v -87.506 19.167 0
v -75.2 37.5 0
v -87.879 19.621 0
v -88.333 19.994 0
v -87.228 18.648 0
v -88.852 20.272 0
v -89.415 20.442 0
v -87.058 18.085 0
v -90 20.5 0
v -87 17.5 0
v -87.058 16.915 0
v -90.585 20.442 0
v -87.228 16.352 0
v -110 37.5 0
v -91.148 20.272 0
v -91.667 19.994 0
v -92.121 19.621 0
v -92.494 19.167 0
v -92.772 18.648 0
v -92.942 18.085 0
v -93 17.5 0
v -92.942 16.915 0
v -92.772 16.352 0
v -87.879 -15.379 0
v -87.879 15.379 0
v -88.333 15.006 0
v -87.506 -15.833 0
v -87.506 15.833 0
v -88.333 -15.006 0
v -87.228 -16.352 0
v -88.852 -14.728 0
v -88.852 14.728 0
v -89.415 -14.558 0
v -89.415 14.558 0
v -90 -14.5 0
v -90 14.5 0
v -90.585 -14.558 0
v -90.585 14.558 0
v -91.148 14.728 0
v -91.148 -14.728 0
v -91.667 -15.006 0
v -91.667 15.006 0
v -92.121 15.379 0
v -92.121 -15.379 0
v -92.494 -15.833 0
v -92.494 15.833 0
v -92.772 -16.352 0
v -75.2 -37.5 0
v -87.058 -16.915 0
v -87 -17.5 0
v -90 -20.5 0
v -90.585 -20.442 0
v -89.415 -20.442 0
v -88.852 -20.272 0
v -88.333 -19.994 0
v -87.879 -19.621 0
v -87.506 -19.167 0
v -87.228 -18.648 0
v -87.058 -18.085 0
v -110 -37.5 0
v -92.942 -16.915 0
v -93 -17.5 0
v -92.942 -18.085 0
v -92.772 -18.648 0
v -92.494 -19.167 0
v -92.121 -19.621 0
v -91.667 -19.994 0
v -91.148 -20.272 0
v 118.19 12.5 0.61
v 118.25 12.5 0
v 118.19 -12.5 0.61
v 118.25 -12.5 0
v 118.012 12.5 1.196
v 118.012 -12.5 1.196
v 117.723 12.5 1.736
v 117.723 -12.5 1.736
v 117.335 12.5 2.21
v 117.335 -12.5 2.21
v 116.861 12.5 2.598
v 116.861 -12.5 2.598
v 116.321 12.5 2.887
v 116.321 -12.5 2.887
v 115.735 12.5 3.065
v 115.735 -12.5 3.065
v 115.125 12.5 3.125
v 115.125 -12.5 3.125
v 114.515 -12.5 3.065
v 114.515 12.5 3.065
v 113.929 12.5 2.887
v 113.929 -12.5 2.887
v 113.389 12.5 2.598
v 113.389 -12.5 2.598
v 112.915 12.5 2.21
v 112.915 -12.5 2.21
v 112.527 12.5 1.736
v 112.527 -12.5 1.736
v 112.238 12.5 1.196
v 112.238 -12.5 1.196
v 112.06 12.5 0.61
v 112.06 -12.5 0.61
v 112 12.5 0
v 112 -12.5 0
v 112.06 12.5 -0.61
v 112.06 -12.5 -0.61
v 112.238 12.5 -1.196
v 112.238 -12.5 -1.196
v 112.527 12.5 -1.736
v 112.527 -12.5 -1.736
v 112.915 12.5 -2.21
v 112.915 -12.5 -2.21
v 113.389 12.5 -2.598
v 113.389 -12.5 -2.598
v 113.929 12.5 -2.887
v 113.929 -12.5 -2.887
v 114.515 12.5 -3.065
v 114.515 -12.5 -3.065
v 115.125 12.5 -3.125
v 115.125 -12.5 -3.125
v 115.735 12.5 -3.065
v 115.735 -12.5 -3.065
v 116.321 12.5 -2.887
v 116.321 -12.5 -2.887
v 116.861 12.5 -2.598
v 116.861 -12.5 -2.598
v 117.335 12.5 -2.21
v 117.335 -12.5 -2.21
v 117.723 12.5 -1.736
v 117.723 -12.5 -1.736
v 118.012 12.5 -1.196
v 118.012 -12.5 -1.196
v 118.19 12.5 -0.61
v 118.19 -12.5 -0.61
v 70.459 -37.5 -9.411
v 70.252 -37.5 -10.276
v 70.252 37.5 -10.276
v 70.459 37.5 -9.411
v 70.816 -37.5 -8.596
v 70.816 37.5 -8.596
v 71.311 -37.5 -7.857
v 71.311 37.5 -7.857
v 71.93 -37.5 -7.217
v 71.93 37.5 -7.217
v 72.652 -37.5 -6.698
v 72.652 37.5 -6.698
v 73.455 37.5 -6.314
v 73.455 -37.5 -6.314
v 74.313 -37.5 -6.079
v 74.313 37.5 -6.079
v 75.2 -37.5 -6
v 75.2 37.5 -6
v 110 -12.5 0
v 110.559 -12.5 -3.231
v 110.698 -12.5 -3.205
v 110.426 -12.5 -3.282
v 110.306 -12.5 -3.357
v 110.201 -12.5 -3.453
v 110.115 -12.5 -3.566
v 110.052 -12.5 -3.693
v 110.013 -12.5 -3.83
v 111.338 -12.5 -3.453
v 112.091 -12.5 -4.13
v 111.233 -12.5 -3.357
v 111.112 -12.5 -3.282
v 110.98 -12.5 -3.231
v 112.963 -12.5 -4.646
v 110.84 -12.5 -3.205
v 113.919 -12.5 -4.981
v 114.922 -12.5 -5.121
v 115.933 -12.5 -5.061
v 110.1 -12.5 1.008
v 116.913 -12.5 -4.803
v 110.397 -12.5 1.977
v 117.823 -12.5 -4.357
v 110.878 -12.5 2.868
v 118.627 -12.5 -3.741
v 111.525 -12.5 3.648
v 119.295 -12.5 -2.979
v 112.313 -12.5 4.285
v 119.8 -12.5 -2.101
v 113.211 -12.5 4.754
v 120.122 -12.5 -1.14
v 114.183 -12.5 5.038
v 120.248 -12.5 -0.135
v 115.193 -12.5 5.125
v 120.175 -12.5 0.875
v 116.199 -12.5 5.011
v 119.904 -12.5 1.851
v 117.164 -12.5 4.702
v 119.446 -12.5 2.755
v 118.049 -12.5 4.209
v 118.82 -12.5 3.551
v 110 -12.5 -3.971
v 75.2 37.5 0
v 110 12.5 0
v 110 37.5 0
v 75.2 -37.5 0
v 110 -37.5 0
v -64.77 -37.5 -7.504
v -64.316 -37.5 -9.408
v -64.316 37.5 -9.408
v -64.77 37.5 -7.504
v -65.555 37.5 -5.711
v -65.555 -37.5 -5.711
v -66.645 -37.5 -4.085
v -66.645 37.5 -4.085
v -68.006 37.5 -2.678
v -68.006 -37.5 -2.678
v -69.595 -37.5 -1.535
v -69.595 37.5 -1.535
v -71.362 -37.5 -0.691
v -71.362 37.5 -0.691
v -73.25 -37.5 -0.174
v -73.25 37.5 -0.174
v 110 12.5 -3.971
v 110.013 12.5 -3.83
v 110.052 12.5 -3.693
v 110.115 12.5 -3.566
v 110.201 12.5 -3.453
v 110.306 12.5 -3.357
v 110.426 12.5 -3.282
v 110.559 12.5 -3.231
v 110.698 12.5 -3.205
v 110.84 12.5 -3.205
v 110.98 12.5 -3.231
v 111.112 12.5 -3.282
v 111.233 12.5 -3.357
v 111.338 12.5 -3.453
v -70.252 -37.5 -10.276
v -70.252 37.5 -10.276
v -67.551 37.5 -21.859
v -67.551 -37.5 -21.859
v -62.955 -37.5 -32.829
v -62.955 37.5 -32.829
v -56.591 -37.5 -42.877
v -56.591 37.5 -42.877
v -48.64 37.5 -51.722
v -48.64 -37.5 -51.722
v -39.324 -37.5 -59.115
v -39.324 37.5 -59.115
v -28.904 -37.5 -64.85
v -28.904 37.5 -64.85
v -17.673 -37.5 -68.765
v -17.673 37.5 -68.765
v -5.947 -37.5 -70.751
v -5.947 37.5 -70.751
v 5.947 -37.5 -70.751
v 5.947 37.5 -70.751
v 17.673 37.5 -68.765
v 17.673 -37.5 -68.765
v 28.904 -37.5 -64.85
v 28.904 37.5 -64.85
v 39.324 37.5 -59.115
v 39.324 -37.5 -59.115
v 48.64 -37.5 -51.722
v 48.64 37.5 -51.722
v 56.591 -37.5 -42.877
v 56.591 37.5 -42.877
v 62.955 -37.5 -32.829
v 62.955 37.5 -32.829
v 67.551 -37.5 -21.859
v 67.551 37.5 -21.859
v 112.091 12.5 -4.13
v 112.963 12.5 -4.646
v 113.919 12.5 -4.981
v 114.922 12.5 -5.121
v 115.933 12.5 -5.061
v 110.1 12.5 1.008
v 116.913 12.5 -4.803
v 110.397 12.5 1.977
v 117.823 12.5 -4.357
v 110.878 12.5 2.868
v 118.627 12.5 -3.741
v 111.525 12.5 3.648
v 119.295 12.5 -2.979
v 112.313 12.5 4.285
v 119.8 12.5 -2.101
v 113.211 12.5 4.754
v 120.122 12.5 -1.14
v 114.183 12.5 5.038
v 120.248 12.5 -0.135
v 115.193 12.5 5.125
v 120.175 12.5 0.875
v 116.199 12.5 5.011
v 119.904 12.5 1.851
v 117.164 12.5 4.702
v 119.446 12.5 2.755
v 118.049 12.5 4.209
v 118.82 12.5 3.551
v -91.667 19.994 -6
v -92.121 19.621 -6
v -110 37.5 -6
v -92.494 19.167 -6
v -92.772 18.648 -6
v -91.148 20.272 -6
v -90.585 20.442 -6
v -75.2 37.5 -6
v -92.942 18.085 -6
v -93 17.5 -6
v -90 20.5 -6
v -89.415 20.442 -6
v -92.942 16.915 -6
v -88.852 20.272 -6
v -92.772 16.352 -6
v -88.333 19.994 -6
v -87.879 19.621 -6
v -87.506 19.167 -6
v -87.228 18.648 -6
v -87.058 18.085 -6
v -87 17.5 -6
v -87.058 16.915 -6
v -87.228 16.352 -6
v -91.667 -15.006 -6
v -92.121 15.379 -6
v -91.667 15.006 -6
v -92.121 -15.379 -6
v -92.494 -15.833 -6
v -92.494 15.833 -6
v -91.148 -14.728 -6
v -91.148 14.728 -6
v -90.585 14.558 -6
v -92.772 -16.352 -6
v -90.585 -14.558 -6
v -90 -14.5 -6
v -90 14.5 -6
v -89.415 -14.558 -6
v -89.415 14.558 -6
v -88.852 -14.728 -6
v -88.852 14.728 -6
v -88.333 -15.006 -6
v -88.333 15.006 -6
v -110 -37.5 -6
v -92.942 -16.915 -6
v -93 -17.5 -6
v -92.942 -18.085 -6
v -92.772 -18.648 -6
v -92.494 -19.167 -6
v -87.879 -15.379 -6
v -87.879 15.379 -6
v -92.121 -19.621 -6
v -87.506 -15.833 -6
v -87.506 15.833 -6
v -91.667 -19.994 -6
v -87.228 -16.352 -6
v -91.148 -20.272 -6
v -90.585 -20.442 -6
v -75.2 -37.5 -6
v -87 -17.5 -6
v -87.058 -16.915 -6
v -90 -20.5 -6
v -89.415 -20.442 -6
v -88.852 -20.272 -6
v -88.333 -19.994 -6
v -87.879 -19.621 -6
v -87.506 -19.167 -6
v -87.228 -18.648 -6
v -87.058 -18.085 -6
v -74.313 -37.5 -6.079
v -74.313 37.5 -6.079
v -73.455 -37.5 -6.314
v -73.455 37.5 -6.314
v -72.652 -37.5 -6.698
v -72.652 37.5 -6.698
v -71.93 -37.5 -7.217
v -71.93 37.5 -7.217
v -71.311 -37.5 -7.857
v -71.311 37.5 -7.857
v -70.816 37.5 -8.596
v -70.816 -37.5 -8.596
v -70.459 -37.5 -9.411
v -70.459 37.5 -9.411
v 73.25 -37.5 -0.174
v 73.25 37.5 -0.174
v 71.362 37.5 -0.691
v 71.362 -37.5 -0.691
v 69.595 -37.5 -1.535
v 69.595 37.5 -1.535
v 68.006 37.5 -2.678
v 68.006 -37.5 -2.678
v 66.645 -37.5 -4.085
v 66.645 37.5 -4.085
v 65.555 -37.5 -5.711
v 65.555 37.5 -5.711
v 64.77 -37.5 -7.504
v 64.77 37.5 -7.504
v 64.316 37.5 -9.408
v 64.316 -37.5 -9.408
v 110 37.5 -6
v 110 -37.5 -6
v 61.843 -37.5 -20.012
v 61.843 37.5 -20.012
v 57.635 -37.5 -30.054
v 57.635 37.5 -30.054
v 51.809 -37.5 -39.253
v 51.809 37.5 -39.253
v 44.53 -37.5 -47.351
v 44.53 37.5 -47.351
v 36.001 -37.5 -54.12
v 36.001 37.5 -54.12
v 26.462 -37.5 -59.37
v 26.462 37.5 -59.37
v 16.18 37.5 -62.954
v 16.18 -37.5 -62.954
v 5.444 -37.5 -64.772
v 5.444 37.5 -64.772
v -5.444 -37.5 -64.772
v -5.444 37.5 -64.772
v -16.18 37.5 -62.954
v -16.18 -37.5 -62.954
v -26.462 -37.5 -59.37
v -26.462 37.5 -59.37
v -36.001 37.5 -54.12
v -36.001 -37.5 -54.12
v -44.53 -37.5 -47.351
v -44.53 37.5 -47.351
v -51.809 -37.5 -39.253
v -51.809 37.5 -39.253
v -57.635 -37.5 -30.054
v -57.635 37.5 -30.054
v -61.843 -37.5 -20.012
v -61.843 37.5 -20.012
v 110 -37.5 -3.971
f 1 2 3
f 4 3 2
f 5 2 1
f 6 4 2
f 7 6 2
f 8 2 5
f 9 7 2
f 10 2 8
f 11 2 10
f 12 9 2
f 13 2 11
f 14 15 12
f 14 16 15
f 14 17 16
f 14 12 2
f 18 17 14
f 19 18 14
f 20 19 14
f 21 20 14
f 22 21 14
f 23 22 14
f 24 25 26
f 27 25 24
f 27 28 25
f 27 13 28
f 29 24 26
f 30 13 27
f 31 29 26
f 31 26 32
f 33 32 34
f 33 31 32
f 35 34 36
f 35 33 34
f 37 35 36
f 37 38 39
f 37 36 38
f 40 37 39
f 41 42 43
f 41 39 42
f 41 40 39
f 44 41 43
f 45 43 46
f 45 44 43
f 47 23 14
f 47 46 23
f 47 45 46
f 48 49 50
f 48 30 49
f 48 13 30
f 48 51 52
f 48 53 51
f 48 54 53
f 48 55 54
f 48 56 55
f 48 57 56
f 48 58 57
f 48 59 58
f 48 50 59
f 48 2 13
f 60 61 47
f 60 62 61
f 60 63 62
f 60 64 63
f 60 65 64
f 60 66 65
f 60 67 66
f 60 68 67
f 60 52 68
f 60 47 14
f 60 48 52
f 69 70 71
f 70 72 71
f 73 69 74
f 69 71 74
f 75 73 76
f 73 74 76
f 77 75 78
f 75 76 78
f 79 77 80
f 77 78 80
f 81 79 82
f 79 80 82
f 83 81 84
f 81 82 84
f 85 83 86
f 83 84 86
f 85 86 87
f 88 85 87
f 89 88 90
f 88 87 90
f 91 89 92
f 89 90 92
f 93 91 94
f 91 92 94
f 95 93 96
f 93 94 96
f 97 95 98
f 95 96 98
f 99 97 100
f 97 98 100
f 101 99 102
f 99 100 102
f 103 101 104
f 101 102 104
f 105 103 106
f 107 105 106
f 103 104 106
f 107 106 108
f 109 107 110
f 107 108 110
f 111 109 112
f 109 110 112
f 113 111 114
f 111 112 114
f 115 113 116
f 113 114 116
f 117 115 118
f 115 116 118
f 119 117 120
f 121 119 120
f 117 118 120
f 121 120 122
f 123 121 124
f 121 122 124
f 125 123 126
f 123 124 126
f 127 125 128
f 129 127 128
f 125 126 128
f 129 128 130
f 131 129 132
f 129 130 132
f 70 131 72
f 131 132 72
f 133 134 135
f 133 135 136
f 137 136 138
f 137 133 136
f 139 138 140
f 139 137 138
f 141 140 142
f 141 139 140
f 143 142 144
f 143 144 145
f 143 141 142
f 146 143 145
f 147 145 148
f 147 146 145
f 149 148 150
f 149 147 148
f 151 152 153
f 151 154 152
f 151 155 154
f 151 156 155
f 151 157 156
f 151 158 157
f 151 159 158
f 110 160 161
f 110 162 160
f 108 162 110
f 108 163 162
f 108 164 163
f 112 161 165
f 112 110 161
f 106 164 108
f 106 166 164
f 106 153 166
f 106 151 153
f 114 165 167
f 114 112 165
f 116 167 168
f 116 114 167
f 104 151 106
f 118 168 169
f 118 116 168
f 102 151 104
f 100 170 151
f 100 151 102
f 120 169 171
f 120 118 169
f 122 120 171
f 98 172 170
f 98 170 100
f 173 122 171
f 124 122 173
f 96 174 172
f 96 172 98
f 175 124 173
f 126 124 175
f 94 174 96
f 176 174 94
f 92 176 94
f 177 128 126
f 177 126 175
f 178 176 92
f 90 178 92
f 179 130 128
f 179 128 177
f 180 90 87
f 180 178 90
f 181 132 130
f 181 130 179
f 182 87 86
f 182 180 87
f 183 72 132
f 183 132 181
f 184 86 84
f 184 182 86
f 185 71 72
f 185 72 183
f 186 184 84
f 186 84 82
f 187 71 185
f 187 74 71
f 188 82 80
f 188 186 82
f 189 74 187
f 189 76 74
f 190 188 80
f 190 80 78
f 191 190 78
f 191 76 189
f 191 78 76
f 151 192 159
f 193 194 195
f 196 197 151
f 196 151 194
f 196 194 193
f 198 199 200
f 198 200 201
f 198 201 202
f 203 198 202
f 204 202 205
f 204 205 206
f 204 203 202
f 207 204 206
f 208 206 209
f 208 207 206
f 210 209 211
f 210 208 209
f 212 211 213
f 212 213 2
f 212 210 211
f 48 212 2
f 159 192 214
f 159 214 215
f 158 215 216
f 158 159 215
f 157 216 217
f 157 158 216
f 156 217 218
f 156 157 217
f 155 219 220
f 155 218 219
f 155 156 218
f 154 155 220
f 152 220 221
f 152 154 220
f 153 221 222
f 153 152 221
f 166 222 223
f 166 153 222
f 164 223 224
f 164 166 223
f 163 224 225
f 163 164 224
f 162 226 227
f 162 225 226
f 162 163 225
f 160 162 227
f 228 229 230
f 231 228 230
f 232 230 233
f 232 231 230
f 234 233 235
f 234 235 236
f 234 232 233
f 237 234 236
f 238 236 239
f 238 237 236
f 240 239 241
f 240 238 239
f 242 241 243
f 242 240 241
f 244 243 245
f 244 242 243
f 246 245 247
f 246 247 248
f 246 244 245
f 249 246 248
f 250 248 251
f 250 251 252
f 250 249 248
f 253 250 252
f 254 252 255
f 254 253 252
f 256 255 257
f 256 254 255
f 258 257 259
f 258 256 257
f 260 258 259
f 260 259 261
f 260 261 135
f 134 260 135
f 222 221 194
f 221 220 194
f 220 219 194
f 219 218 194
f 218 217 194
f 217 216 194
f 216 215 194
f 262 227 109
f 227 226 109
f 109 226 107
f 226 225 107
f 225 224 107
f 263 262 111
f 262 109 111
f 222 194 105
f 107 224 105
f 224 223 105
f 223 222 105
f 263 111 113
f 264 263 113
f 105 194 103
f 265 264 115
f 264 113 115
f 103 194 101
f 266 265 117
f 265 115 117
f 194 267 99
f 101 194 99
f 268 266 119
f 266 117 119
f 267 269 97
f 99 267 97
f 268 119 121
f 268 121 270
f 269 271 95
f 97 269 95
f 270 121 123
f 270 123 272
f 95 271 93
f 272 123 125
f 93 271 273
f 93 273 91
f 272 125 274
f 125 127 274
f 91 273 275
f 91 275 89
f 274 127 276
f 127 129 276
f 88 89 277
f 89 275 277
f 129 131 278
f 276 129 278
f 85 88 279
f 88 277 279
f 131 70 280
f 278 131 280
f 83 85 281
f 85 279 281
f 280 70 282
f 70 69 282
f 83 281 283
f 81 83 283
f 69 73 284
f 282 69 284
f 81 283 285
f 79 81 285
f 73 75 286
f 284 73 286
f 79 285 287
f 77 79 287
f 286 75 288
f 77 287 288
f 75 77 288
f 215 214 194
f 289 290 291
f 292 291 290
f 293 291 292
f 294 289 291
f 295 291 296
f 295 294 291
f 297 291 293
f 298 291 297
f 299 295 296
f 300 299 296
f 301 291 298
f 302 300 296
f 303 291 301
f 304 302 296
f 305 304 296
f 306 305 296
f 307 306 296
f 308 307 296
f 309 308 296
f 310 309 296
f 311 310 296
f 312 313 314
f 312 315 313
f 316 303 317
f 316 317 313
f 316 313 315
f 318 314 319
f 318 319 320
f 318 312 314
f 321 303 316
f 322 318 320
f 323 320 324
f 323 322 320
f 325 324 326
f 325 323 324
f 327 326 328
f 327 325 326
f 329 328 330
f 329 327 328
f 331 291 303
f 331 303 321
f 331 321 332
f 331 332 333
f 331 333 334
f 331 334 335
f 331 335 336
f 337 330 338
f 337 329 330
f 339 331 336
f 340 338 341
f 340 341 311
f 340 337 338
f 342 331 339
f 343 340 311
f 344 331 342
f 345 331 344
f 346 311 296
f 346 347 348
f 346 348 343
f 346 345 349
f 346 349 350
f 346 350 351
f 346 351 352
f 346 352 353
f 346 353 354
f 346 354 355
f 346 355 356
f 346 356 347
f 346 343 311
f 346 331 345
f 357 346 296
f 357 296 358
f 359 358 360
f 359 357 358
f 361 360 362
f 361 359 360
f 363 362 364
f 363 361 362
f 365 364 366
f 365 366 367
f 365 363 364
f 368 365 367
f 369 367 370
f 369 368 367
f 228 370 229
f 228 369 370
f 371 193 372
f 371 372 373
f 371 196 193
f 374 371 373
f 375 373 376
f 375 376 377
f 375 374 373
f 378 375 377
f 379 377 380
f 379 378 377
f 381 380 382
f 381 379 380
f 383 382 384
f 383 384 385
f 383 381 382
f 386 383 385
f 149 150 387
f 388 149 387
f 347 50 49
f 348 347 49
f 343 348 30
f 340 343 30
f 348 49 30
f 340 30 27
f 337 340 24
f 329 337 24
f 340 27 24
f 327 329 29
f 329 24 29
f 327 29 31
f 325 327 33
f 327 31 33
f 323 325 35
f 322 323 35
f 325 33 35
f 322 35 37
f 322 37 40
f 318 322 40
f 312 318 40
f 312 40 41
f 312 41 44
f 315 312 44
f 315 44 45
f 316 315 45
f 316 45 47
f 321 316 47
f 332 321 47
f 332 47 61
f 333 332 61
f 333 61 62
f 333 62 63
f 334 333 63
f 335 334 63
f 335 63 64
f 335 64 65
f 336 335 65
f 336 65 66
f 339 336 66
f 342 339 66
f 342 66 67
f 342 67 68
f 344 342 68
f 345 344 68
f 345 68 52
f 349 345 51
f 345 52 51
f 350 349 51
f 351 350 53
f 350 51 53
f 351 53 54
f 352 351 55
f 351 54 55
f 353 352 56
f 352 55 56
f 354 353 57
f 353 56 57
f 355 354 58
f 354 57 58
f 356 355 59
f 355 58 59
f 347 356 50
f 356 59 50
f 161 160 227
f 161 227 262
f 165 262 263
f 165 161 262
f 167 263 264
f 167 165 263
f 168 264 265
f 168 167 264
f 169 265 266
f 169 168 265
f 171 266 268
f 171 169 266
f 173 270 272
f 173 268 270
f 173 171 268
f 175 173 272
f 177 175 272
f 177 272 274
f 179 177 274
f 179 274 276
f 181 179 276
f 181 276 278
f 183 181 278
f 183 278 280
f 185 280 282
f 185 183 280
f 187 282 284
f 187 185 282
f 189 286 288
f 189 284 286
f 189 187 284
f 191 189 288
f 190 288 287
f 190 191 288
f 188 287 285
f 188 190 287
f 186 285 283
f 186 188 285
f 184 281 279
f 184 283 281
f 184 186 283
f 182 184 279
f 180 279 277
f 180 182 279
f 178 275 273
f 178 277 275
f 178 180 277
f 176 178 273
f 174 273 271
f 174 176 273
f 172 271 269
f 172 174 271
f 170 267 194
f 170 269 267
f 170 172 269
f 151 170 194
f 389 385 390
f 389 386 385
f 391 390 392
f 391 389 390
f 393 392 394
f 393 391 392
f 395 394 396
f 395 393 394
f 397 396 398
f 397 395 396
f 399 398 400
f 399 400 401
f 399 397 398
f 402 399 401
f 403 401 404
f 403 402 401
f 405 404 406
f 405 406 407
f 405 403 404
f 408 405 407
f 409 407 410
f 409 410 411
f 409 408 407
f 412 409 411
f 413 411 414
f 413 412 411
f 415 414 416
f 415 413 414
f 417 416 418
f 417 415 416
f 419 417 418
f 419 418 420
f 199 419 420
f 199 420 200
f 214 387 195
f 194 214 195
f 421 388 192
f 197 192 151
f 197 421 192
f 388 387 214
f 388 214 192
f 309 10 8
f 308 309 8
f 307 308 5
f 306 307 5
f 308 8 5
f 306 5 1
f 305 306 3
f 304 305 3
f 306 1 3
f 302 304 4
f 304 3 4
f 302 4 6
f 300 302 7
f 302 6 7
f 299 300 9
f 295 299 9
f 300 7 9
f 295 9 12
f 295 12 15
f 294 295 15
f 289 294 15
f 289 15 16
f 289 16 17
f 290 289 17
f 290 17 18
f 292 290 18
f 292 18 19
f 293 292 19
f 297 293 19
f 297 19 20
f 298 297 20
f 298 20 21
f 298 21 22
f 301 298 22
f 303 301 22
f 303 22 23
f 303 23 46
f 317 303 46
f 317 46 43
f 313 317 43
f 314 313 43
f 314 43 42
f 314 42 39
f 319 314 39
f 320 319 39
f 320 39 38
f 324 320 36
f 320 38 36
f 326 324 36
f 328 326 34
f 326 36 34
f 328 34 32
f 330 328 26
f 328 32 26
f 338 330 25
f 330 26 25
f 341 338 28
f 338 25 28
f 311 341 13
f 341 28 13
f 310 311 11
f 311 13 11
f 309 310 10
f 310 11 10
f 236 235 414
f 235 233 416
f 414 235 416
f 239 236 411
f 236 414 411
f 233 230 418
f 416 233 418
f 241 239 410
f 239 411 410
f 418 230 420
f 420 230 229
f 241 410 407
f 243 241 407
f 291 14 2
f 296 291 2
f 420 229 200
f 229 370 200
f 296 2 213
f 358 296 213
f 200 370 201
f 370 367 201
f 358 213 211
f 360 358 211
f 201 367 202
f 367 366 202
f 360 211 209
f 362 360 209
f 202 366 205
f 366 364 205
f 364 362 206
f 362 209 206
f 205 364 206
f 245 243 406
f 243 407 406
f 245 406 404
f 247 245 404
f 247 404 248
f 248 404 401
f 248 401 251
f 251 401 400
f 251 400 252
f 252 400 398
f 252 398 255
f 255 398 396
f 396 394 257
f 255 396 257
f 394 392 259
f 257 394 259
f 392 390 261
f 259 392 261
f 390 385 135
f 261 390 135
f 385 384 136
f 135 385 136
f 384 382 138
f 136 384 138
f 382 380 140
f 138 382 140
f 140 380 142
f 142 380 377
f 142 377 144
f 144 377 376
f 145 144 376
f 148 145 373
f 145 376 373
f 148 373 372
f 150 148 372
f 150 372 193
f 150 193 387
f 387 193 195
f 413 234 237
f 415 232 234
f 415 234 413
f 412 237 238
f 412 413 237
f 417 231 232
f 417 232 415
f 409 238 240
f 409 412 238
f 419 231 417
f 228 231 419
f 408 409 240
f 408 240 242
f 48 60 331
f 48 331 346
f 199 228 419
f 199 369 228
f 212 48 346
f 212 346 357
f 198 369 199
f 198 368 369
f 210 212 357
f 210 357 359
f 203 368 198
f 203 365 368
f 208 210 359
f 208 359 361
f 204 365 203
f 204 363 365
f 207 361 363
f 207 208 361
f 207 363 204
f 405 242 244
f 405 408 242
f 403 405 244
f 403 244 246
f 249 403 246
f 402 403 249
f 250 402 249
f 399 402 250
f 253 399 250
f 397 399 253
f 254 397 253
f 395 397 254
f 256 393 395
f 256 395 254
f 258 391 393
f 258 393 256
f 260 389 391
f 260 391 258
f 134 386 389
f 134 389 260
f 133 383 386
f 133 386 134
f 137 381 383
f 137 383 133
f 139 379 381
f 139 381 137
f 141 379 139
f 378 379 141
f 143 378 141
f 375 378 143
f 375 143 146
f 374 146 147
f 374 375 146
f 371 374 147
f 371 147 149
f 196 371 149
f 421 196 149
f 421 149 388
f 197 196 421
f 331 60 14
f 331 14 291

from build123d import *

# Parameters (mm, degrees)
F1_DEPTH      = 37.5
F3_R          = 3.125
F4_DEPTH      = 37.5
F4_DEPTH_BACK = 37.5
F5_W          = 15.7129609585
F5_H          = 26.9097045064
F5_W_2        = 22.5772851706
F5_H_2        = 27.5291122496
F6_DEPTH      = 71.001
F6_DEPTH_BACK = 5.126
F2_R          = 3
F7_DEPTH      = 71.001


with BuildPart() as f1:
    # F0 (on Front) → F1 (new body, symmetric)
    with BuildSketch(Plane.XZ):
        with BuildLine():
            ThreePointArc((64.3155620097, -9.4078947368), (0, -65), (-64.3155620097, -9.4078947368))
            ThreePointArc((-64.3155620097, -9.4078947368), (-68.0064440401, -2.6779462302), (-75.1997340421, 0))
            Line((-75.1997340421, 0), (-110, 0))
            Line((-110, 0), (-110, -6))
            Line((-110, -6), (-75.1997340421, -6))
            ThreePointArc((-75.1997340421, -6), (-71.9300567685, -7.2172482865), (-70.2523831183, -10.2763157895))
            ThreePointArc((-70.2523831183, -10.2763157895), (0, -71), (70.2523831183, -10.2763157895))
            ThreePointArc((70.2523831183, -10.2763157895), (71.9300567685, -7.2172482865), (75.1997340421, -6))
            Line((75.1997340421, -6), (110, -6))
            Line((110, -6), (110, 0))
            Line((110, 0), (75.1997340421, 0))
            ThreePointArc((75.1997340421, 0), (68.0064440401, -2.6779462302), (64.3155620097, -9.4078947368))
        make_face()
    extrude(amount=F1_DEPTH, both=True)

    # F3 (on Front) → F4 (join, two sides)
    with BuildSketch(Plane.XZ) as f4_sk:
        with BuildLine():
            ThreePointArc((110, -3.971), (110.4913325801, -3.253734436), (111.3376547749, -3.4527729648))
            ThreePointArc((111.3376547749, -3.4527729648), (119.9038999403, 1.851415772), (110, 0))
            Line((110, 0), (110, -3.971))
        make_face()
        with Locations((115.125, 0)):
            Circle(F3_R, mode=Mode.SUBTRACT)
    extrude(amount=F4_DEPTH)
    extrude(f4_sk.sketch, amount=-F4_DEPTH_BACK)

    # F5 (on Top) → F6 (cut, two sides)
    with BuildSketch(Plane.XY) as f6_sk:
        with Locations((117.8564804792, -25.9548522532)):
            Rectangle(F5_W, F5_H)
        with Locations((121.2886425853, 26.2645561248)):
            Rectangle(F5_W_2, F5_H_2)
    extrude(amount=-F6_DEPTH, mode=Mode.SUBTRACT)
    extrude(f6_sk.sketch, amount=F6_DEPTH_BACK, mode=Mode.SUBTRACT)

    # F2 (on face) → F7 (cut, through all)
    with BuildSketch(Plane.XY):
        with Locations((-90, 17.5)):
            Circle(F2_R)
        with Locations((-90, -17.5)):
            Circle(F2_R)
    extrude(amount=-F7_DEPTH, mode=Mode.SUBTRACT)


solid = f1.part
